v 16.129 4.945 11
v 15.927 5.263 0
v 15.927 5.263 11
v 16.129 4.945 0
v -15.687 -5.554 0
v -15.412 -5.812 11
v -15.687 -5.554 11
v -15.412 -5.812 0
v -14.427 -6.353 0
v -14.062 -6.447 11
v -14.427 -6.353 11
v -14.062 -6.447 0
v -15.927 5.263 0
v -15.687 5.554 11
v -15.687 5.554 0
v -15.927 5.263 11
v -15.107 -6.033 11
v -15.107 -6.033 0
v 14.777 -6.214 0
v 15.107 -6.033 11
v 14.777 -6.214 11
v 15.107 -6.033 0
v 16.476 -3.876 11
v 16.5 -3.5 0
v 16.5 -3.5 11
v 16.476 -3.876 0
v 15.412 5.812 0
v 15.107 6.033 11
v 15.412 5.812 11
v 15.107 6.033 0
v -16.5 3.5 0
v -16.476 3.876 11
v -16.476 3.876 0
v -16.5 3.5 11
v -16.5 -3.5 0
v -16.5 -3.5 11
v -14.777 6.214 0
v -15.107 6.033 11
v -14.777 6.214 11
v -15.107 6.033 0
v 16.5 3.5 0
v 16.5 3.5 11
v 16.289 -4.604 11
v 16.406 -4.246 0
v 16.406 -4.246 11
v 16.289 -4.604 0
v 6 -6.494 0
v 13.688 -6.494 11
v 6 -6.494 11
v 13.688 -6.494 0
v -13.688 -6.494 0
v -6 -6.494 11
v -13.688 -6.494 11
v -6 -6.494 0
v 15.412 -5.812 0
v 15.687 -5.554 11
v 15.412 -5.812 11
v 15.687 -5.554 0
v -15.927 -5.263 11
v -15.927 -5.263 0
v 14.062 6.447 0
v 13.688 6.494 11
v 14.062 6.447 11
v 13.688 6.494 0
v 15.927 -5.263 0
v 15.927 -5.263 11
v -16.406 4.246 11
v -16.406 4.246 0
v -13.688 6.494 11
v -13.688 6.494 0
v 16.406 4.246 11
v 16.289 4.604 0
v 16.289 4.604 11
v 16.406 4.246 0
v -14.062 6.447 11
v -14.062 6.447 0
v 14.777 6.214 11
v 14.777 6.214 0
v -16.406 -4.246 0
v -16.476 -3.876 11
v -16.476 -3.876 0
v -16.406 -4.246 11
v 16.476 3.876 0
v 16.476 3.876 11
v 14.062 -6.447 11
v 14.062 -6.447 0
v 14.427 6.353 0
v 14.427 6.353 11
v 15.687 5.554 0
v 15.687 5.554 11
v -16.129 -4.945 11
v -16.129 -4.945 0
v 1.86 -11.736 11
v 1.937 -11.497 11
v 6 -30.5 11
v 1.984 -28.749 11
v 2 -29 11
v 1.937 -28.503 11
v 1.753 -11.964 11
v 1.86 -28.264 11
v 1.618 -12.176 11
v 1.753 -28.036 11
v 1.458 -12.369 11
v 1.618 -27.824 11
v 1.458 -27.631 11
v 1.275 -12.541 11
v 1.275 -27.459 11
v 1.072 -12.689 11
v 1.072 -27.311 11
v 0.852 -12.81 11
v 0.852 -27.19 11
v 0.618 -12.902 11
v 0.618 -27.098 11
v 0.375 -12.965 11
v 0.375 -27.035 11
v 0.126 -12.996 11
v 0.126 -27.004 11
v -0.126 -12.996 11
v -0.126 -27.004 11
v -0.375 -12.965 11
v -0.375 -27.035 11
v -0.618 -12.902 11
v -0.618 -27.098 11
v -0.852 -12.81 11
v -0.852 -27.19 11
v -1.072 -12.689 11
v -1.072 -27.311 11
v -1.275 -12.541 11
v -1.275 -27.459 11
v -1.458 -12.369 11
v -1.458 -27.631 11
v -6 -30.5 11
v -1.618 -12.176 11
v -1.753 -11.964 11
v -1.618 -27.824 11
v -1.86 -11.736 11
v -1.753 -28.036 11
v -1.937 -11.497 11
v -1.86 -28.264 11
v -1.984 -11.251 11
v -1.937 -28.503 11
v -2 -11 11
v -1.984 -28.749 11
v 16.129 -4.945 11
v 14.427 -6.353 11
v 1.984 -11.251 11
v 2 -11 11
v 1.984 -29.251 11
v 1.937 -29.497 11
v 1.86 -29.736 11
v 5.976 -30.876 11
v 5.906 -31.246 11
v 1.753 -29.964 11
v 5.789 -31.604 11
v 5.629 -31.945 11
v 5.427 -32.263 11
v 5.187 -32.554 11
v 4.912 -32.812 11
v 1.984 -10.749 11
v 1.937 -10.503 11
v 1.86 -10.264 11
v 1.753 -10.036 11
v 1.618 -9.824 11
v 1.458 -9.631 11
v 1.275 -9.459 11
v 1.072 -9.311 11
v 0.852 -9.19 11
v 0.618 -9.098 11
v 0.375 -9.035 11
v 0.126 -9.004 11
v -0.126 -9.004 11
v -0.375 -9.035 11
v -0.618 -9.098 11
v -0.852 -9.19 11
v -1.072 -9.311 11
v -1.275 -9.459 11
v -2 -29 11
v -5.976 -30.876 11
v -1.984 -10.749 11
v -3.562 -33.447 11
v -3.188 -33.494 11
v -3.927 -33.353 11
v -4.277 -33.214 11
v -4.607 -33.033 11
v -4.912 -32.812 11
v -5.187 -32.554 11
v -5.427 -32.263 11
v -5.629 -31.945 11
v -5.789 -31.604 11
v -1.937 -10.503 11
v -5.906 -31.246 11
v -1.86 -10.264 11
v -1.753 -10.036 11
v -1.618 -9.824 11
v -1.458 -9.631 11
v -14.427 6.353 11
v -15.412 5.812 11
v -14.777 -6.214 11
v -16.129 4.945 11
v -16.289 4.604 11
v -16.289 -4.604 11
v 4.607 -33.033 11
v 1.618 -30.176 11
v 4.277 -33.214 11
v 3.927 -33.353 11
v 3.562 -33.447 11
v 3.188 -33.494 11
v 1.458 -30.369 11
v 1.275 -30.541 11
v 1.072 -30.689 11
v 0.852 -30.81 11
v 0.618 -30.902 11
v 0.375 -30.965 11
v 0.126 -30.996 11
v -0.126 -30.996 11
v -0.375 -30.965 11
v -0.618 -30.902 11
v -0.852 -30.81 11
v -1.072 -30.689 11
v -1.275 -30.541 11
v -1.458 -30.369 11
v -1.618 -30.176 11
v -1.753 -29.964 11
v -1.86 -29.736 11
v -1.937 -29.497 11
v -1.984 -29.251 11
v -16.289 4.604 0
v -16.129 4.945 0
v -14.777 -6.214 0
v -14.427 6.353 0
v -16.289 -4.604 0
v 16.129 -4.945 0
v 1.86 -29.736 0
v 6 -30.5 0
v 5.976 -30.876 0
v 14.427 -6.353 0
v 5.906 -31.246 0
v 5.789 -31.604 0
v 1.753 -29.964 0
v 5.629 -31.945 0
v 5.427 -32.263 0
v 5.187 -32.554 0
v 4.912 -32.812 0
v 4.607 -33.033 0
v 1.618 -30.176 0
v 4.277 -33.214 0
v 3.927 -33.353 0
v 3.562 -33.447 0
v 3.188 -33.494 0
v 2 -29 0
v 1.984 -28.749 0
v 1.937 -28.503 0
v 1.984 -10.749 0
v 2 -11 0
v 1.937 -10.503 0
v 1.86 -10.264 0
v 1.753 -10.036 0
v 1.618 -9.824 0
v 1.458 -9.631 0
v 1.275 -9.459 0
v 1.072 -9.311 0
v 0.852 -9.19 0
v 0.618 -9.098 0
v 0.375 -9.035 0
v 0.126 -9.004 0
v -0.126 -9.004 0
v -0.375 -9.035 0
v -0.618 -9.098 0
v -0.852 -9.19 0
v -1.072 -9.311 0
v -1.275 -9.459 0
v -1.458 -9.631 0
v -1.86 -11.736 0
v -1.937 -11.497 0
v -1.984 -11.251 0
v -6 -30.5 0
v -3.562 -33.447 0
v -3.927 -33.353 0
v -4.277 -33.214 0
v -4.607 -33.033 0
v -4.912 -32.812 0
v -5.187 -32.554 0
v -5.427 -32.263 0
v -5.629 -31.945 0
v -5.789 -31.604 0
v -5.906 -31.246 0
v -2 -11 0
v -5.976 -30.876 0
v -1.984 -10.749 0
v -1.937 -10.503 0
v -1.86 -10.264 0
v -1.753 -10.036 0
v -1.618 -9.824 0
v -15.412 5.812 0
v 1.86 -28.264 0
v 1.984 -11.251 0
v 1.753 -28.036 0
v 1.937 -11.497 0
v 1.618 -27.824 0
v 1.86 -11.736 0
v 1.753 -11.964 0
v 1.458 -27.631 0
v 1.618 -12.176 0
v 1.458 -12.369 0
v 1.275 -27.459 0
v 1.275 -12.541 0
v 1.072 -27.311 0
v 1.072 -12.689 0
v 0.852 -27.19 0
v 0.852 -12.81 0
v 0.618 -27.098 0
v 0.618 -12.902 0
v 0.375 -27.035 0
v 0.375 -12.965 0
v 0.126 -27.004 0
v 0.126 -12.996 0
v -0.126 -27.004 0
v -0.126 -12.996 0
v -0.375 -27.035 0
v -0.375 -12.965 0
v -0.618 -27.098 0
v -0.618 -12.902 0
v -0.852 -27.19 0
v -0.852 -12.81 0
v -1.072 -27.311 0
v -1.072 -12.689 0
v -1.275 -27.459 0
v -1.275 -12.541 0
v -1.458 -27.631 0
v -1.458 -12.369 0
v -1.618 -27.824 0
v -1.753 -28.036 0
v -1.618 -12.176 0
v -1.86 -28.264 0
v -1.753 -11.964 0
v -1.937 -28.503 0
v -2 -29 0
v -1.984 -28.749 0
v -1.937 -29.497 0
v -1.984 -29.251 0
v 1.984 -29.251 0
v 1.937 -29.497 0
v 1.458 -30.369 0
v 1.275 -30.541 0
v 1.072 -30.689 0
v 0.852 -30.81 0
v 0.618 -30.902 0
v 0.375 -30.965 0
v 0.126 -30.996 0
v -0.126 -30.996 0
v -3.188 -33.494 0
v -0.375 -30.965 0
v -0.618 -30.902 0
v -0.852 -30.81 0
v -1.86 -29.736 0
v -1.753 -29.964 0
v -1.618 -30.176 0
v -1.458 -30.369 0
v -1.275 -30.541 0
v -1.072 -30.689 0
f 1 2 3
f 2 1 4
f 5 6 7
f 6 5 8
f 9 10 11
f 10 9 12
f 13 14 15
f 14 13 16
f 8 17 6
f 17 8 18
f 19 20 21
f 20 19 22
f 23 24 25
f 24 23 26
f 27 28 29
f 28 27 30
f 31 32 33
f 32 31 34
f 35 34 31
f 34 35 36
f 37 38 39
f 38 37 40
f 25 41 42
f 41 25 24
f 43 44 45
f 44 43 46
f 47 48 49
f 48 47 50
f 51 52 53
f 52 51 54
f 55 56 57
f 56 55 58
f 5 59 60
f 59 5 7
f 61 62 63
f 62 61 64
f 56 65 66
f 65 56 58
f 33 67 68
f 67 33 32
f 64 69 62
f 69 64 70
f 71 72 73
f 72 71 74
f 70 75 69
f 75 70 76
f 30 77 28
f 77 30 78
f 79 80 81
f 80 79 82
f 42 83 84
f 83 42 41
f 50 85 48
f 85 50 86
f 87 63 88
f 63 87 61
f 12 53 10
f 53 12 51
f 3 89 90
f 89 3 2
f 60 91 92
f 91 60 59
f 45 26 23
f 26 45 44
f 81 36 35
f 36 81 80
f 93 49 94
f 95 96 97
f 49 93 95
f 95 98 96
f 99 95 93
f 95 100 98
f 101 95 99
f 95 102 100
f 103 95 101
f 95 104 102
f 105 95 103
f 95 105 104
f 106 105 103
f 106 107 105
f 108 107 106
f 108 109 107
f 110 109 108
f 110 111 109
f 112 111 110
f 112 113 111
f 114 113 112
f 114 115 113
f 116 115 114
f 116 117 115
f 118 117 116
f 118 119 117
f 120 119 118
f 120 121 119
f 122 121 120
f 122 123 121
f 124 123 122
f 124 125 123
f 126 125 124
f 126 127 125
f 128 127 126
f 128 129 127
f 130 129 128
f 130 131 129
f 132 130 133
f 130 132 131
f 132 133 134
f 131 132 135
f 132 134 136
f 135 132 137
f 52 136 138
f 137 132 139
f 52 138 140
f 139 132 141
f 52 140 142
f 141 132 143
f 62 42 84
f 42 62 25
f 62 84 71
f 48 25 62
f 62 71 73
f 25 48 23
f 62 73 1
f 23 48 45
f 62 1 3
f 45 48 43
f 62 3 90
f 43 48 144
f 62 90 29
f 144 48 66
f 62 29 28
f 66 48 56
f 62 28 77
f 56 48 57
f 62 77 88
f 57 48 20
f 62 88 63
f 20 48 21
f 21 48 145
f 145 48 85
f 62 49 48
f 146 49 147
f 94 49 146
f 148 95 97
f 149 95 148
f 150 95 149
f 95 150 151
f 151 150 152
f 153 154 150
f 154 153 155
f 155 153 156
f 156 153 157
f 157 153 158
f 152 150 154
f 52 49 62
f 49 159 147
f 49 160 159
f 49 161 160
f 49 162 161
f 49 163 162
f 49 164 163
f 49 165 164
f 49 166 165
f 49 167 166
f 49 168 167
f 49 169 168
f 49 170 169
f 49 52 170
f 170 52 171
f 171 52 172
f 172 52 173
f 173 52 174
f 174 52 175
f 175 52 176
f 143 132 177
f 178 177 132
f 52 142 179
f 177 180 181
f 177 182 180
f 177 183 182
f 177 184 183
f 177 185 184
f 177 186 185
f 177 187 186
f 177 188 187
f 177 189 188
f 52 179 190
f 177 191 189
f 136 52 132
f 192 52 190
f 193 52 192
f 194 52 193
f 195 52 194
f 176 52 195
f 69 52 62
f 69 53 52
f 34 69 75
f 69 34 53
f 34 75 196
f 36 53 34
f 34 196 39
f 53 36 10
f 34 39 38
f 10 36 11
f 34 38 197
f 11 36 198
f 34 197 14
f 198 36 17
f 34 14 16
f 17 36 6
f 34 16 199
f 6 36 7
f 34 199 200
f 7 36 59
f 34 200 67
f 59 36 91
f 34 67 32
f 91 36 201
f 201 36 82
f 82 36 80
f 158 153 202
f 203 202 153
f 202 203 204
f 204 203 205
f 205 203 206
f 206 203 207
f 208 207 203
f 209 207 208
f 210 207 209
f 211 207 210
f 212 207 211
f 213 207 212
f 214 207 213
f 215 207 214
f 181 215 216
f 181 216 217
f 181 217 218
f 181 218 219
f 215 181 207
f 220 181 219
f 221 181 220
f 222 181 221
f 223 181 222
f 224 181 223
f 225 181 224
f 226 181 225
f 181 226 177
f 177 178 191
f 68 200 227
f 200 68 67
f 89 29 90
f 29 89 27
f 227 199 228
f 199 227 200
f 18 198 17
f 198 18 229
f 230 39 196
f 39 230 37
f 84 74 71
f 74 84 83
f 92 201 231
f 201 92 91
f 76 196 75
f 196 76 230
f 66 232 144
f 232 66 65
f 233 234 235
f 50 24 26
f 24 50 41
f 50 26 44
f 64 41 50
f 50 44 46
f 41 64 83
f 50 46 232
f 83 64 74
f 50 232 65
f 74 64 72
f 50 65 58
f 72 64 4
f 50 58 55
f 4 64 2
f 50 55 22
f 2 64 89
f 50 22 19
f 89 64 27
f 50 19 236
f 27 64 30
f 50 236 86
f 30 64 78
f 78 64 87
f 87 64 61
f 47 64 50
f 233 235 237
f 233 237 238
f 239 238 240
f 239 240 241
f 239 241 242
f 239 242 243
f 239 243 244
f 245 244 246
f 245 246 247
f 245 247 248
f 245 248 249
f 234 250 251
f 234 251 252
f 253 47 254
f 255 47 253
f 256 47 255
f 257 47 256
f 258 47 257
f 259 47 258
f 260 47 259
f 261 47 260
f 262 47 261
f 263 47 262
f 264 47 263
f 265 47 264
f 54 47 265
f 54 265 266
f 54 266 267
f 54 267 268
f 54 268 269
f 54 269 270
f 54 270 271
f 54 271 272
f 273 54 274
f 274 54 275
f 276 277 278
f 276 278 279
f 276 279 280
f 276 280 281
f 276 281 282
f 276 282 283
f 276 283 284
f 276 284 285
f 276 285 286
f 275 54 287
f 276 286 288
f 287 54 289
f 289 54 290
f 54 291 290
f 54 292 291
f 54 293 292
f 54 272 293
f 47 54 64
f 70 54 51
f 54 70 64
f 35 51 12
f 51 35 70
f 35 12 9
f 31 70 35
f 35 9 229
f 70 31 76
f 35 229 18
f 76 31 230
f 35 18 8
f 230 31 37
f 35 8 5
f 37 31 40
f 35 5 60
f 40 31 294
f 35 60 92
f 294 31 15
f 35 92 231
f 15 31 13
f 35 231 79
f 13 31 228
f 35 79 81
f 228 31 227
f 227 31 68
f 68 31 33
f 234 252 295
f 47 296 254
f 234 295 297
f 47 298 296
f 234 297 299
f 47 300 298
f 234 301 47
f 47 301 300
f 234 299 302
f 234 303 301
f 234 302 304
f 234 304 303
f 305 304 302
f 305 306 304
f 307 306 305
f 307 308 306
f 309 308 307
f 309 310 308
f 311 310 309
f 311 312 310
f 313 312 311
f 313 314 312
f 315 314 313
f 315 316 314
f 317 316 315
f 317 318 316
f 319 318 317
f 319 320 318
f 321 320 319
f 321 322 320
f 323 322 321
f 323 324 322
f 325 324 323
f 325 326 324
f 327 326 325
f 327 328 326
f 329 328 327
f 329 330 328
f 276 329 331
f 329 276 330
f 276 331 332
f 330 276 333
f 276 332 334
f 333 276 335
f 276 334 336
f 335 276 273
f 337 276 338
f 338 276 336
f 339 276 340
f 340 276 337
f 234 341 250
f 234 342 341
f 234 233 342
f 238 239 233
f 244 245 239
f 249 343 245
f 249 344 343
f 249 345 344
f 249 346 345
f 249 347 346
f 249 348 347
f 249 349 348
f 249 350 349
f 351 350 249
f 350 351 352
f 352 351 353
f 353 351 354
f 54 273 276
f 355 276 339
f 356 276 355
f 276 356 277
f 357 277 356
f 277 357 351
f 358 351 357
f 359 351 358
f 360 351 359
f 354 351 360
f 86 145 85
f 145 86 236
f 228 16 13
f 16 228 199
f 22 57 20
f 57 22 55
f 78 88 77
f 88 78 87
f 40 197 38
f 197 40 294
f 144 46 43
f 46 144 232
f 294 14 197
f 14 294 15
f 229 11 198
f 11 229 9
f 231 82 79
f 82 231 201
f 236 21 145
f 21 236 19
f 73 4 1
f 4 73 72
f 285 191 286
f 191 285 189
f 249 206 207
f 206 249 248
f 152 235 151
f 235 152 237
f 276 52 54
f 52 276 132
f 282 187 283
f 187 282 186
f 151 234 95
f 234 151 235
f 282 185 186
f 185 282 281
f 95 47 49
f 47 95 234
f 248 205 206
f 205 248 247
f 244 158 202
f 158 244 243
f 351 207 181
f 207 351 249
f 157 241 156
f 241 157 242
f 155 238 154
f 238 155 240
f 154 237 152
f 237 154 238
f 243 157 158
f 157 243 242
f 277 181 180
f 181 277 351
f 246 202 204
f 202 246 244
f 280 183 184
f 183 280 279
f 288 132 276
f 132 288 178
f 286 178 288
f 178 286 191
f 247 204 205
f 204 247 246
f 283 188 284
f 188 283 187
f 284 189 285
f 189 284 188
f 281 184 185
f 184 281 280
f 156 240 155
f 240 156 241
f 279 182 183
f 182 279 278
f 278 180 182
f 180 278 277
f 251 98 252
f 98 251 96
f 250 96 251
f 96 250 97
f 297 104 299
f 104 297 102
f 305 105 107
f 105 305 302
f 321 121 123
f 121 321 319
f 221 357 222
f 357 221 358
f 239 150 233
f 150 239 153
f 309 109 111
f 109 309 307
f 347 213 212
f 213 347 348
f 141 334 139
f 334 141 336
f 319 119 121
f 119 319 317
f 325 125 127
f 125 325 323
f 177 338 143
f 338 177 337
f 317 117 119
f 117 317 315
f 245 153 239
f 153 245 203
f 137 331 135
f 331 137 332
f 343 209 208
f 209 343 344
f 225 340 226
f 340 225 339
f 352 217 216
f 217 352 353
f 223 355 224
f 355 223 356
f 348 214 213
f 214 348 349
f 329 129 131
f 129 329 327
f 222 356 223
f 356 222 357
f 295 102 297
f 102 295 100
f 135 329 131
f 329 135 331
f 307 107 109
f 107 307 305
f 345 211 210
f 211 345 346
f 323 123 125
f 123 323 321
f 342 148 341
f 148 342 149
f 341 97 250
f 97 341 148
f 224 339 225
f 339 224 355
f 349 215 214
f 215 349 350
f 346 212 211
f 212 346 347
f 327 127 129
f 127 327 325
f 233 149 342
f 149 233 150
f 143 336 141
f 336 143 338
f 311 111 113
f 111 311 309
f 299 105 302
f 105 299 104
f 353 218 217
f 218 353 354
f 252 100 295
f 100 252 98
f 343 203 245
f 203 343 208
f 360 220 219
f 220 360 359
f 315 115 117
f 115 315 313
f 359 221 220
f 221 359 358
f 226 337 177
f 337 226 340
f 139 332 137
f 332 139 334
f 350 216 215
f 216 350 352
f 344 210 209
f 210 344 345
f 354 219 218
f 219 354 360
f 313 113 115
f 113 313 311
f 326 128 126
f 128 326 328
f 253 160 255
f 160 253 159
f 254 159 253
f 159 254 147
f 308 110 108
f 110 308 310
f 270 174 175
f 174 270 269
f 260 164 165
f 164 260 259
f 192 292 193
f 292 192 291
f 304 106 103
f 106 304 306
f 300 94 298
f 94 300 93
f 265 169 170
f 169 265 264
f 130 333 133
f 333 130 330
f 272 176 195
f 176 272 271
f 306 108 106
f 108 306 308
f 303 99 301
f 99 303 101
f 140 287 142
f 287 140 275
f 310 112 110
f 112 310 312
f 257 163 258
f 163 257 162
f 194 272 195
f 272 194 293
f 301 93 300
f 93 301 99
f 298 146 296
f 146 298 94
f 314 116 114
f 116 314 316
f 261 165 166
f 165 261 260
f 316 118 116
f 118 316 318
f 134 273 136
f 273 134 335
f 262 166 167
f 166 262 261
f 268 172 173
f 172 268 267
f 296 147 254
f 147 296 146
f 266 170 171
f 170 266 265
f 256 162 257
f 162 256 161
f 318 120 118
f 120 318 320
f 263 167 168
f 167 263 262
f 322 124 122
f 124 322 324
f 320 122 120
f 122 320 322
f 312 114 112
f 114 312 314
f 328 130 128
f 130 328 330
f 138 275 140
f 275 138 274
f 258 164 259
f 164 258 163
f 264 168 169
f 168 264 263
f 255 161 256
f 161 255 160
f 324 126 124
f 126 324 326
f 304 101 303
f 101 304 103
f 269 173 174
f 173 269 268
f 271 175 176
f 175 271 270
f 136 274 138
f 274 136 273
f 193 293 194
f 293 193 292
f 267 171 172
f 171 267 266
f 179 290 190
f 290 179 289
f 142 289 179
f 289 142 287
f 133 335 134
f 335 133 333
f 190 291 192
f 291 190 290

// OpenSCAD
SLING_THICKNESS = 11;
SLOT_WIDTH = 13;
SLOT_THICKNESS = 12;
SLOT_LENGTH = 33;
SLOT_HEIGHT = 40;
CORNER_DIA = 6;

HOLE_SPACING = 18;
HOLE_DIA = 4;

$fn = 50;

module mount_holes(width, length, thickness, dia) {
  for(i = [-1, 1]) {
    for(j = [-1, 1]) {
      translate([i * width/2, j * length/2, 0])
      cylinder(d = dia, h = thickness);
    }
  }
}
module rounded_rect(width, length, thickness, corner_dia) {
  hull() {
    mount_holes(width-corner_dia, length-corner_dia, thickness, corner_dia);
  }
}

module adapter() {
  difference() {
    union() {
      rounded_rect(SLOT_LENGTH, SLOT_WIDTH, SLING_THICKNESS, CORNER_DIA);
      translate([0, -(SLOT_HEIGHT - SLOT_WIDTH)/2, 0])
      rounded_rect(SLOT_THICKNESS, SLOT_HEIGHT, SLING_THICKNESS, CORNER_DIA);
    }
    
    #translate([0, -(SLOT_HEIGHT - SLOT_WIDTH)/2 - SLOT_WIDTH/2, 0])
    mount_holes(0, HOLE_SPACING, SLING_THICKNESS, HOLE_DIA);
  }
}

adapter();
